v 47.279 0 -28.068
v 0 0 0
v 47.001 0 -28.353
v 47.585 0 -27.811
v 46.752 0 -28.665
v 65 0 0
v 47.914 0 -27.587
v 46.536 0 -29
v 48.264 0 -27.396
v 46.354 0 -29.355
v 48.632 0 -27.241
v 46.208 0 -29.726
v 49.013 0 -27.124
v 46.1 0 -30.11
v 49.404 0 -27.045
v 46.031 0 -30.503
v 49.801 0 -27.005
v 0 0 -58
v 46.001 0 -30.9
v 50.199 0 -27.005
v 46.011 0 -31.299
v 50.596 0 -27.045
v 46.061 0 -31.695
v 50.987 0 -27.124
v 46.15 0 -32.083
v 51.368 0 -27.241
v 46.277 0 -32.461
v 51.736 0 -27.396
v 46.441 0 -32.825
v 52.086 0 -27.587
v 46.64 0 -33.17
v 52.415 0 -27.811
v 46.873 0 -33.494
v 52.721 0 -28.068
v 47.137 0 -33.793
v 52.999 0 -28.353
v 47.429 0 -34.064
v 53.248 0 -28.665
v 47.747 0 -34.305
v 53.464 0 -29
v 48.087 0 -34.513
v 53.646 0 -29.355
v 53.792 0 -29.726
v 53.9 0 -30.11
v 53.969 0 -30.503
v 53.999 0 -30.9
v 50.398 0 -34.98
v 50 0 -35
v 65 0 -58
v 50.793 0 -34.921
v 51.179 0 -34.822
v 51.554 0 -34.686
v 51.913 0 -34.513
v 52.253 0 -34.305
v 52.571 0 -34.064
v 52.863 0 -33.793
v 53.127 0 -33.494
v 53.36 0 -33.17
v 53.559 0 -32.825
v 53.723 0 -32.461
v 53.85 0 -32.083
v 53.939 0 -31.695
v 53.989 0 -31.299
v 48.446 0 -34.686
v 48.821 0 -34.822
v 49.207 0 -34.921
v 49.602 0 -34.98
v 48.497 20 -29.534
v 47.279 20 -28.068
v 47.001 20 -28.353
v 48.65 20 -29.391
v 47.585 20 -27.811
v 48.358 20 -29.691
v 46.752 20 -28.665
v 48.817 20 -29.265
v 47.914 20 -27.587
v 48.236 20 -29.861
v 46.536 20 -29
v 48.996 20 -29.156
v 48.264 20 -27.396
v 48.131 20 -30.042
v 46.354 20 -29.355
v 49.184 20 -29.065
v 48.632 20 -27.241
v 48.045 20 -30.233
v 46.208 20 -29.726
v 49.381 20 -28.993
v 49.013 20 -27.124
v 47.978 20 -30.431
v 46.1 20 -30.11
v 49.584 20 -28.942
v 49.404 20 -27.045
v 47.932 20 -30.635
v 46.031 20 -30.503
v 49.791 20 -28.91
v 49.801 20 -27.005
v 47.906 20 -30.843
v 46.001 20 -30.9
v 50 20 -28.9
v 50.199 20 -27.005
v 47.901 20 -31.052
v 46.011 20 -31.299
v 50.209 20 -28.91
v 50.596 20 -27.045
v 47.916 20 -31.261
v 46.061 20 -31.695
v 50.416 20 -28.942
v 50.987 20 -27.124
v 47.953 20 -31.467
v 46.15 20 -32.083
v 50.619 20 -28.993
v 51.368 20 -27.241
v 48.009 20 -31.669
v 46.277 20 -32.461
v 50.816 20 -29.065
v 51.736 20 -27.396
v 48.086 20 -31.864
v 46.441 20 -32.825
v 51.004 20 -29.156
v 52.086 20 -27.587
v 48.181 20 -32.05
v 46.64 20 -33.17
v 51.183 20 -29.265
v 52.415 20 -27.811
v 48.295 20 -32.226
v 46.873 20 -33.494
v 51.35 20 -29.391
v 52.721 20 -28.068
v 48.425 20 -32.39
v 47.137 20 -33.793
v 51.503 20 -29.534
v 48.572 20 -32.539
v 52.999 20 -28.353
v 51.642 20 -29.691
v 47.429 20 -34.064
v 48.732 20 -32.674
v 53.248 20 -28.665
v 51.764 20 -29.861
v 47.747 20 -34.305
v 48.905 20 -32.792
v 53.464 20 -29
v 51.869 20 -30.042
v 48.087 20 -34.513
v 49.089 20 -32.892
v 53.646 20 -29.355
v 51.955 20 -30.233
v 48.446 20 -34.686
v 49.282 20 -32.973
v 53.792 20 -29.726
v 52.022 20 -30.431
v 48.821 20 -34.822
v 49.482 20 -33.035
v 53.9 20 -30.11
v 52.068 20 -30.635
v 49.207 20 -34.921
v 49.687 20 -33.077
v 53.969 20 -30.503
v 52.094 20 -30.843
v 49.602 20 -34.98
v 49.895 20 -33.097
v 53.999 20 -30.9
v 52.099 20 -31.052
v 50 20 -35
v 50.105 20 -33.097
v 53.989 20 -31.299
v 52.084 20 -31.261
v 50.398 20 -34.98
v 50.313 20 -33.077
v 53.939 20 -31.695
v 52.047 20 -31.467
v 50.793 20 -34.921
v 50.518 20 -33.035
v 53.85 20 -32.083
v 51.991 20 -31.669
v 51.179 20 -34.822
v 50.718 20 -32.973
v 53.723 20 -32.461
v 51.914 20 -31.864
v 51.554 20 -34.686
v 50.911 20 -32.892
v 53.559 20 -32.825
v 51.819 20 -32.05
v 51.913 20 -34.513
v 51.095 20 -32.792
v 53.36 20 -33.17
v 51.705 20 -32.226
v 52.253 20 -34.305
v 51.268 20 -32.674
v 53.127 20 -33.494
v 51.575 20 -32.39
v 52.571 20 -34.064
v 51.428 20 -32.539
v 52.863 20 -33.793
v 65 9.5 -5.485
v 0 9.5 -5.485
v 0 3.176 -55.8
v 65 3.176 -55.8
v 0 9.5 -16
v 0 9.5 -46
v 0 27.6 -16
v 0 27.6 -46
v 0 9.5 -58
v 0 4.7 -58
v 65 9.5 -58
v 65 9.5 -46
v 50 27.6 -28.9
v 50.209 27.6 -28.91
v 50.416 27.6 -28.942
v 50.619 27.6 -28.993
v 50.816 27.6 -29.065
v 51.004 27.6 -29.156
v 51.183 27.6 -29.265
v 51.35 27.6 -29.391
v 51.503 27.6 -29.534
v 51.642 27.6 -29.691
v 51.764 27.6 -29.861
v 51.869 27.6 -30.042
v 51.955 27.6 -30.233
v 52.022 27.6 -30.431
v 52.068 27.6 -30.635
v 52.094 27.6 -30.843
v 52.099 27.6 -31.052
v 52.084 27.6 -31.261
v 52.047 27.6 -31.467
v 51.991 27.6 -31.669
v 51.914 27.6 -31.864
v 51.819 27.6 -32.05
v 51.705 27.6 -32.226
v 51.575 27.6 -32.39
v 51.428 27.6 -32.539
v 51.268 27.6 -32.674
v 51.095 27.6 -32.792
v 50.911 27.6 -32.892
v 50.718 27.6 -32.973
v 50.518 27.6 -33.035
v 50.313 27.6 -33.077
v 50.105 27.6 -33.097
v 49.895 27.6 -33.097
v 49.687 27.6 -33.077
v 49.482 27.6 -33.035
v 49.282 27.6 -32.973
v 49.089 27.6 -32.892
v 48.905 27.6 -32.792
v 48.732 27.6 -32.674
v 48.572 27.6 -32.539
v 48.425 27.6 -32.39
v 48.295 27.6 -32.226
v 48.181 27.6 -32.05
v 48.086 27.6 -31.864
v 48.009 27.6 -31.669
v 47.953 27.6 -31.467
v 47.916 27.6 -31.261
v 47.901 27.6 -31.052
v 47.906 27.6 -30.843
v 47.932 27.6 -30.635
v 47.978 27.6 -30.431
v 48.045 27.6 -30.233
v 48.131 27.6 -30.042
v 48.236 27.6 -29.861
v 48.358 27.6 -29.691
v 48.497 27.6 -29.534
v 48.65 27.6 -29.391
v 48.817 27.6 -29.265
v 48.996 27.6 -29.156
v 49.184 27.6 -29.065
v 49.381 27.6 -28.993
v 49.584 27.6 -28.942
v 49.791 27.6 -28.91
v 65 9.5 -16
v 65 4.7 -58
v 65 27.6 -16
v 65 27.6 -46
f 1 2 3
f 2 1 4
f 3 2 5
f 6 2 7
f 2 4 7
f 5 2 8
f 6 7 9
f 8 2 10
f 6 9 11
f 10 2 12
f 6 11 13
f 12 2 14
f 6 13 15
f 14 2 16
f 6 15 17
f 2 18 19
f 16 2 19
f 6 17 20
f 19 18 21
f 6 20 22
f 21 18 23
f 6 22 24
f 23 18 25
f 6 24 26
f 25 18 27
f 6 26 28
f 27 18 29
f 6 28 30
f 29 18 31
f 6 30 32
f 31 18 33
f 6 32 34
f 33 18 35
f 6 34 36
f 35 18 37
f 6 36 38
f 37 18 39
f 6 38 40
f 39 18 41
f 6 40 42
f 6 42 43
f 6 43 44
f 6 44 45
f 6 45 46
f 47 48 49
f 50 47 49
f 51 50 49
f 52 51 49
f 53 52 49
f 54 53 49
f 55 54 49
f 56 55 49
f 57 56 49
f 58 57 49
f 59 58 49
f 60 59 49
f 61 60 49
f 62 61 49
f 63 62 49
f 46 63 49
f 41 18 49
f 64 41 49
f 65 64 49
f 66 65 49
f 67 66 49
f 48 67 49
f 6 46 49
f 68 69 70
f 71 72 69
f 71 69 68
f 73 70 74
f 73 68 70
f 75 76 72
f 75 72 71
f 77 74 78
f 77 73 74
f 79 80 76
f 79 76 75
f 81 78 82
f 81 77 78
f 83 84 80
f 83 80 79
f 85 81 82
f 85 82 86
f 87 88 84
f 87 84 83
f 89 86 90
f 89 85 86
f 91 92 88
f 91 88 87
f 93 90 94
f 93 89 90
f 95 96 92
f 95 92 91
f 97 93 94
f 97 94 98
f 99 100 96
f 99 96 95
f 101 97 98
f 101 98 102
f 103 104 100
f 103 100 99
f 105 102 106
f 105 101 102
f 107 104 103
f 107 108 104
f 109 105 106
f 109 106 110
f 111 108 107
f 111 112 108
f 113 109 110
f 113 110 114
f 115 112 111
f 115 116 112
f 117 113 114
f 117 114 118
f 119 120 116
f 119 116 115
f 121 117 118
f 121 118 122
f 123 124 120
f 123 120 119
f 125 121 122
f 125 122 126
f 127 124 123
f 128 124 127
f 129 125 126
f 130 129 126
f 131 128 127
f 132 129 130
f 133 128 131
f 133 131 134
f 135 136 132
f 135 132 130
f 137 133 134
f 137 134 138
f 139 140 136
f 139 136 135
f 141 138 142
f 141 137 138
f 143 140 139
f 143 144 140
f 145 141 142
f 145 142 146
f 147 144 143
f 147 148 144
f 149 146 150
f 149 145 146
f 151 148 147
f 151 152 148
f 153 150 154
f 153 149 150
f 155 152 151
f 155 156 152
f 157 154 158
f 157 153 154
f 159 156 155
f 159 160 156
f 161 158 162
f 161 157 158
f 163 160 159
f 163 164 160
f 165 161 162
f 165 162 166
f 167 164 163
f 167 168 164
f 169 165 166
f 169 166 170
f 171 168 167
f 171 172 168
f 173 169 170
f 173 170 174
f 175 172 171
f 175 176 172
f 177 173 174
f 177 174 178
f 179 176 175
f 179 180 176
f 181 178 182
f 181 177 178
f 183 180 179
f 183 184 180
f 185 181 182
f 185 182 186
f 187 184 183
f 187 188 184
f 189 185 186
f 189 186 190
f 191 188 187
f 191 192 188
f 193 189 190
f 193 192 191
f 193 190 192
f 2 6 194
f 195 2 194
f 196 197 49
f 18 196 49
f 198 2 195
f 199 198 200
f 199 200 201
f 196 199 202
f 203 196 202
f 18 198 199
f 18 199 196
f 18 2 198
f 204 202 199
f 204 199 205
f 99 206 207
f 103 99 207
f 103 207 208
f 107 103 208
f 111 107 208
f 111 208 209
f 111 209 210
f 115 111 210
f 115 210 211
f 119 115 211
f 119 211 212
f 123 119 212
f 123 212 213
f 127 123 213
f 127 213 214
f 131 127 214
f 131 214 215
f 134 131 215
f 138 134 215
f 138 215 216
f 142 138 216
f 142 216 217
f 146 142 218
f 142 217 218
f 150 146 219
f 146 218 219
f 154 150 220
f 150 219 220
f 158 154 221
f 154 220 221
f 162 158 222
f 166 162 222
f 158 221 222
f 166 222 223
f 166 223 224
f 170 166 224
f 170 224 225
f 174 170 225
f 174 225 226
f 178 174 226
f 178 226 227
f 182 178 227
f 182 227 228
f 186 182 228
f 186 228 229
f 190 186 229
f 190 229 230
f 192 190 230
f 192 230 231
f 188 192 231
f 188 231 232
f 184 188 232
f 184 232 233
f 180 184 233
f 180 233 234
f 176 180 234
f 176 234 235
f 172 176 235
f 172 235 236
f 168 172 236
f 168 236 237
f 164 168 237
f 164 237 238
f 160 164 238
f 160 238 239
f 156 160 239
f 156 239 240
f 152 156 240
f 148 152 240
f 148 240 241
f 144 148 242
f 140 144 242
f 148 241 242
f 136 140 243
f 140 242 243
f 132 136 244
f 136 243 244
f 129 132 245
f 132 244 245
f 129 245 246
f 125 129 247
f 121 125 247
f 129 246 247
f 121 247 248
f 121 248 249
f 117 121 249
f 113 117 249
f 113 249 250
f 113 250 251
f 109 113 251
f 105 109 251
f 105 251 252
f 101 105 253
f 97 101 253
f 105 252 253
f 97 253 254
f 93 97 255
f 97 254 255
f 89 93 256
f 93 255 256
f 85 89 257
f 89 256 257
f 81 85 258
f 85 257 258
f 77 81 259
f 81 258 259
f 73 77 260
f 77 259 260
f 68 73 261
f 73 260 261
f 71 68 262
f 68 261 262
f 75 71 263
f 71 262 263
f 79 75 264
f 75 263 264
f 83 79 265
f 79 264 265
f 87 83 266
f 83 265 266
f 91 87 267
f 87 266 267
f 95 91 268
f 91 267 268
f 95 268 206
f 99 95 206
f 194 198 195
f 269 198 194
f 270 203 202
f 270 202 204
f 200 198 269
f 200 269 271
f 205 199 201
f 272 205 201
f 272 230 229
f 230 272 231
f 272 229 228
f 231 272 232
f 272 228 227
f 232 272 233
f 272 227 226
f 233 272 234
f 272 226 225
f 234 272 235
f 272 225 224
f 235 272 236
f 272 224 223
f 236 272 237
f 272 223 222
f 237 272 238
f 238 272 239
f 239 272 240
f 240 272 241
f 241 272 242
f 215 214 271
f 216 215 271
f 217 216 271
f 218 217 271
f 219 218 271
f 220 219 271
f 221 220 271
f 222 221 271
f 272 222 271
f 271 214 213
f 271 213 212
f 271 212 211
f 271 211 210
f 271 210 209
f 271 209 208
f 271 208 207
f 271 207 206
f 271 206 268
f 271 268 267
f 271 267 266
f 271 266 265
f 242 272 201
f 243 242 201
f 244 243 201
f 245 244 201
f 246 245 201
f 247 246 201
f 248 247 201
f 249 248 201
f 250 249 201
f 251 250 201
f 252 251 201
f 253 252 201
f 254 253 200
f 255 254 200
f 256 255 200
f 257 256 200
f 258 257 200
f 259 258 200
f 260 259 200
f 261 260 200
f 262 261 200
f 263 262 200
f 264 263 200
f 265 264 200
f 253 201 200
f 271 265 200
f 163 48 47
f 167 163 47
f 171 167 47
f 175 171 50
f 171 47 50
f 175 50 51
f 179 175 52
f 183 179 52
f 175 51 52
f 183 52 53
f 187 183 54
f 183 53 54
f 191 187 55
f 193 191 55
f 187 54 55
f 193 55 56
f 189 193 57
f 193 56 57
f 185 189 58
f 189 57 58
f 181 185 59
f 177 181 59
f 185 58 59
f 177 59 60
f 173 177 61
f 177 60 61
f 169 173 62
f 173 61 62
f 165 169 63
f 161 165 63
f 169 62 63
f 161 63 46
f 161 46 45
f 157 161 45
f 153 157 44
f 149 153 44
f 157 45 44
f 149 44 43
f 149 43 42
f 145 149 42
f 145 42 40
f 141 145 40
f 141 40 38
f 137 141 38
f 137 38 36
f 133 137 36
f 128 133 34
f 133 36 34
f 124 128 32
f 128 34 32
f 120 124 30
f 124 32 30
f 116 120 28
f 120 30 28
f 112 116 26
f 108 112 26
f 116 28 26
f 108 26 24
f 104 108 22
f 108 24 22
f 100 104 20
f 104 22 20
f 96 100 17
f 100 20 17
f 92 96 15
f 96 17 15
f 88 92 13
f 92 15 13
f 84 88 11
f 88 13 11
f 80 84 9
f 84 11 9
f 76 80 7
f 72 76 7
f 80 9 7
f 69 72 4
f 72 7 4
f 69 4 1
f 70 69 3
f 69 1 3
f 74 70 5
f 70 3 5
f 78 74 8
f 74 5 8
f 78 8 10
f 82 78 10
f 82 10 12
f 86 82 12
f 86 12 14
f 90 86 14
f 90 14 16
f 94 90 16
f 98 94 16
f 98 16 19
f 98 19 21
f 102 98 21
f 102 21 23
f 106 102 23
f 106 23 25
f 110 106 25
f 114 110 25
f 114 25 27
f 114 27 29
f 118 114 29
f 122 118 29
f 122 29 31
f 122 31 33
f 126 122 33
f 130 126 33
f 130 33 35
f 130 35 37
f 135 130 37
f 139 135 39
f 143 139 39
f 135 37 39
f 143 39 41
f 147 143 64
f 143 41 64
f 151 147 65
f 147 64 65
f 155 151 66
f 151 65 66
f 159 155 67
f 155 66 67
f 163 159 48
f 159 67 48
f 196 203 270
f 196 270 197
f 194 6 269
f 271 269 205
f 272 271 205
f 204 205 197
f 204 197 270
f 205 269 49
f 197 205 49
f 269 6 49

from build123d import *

# Parameters (mm, degrees)
SKETCH1_W      = 65
SKETCH1_H      = 58
EXTRUDE1_DEPTH = 9.5
EXTRUDE2_DEPTH = 66
EXTRUDE3_DEPTH = 66
SKETCH4_W      = 30
SKETCH4_H      = 18.1
EXTRUDE4_DEPTH = 65
SKETCH5_R      = 2.1
EXTRUDE5_DEPTH = 28.6
SKETCH6_R      = 4
EXTRUDE6_DEPTH = 20


with BuildPart() as part:
    # Sketch1 → Extrude1 (new body)
    with BuildSketch(Plane(origin=(0, 0, 0), x_dir=(1, 0, 0), z_dir=(0, 1, 0))):
        with Locations((32.5, 29)):
            Rectangle(SKETCH1_W, SKETCH1_H)
    extrude(amount=EXTRUDE1_DEPTH)

    # Sketch2 → Extrude2 (cut, through all)
    with BuildSketch(Plane(origin=(65, 0, 0), x_dir=(0, 0, -1), z_dir=(1, 0, 0))):
        Polygon((0, 0), (5.484827557, 9.5), (0, 9.5), align=None)
    extrude(amount=-EXTRUDE2_DEPTH, mode=Mode.SUBTRACT)

    # Sketch3 → Extrude3 (cut, through all)
    with BuildSketch(Plane(origin=(65, 0, 0), x_dir=(0, 0, -1), z_dir=(1, 0, 0))):
        Polygon((58, 0), (58, 4.7), (55.8, 3.176135582), align=None)
    extrude(amount=-EXTRUDE3_DEPTH, mode=Mode.SUBTRACT)

    # Sketch4 → Extrude4 (add)
    with BuildSketch(Plane.ZY):
        with Locations((-31, 18.55)):
            Rectangle(SKETCH4_W, SKETCH4_H)
    extrude(amount=-EXTRUDE4_DEPTH)

    # Sketch5 → Extrude5 (cut, through all)
    with BuildSketch(Plane(origin=(0, 27.6, 0), x_dir=(1, 0, 0), z_dir=(0, 1, 0))):
        with Locations(Location((50, 31, 0), (0, 0, 270))):  # turned: the seam where the file's is
            Circle(SKETCH5_R)
    extrude(amount=-EXTRUDE5_DEPTH, mode=Mode.SUBTRACT)

    # Sketch6 → Extrude6 (cut)
    with BuildSketch(Plane.XZ):
        with Locations(Location((50, -31, 0), (0, 0, 270))):  # turned: the seam where the file's is
            Circle(SKETCH6_R)
    extrude(amount=-EXTRUDE6_DEPTH, mode=Mode.SUBTRACT)


solid = part.part
